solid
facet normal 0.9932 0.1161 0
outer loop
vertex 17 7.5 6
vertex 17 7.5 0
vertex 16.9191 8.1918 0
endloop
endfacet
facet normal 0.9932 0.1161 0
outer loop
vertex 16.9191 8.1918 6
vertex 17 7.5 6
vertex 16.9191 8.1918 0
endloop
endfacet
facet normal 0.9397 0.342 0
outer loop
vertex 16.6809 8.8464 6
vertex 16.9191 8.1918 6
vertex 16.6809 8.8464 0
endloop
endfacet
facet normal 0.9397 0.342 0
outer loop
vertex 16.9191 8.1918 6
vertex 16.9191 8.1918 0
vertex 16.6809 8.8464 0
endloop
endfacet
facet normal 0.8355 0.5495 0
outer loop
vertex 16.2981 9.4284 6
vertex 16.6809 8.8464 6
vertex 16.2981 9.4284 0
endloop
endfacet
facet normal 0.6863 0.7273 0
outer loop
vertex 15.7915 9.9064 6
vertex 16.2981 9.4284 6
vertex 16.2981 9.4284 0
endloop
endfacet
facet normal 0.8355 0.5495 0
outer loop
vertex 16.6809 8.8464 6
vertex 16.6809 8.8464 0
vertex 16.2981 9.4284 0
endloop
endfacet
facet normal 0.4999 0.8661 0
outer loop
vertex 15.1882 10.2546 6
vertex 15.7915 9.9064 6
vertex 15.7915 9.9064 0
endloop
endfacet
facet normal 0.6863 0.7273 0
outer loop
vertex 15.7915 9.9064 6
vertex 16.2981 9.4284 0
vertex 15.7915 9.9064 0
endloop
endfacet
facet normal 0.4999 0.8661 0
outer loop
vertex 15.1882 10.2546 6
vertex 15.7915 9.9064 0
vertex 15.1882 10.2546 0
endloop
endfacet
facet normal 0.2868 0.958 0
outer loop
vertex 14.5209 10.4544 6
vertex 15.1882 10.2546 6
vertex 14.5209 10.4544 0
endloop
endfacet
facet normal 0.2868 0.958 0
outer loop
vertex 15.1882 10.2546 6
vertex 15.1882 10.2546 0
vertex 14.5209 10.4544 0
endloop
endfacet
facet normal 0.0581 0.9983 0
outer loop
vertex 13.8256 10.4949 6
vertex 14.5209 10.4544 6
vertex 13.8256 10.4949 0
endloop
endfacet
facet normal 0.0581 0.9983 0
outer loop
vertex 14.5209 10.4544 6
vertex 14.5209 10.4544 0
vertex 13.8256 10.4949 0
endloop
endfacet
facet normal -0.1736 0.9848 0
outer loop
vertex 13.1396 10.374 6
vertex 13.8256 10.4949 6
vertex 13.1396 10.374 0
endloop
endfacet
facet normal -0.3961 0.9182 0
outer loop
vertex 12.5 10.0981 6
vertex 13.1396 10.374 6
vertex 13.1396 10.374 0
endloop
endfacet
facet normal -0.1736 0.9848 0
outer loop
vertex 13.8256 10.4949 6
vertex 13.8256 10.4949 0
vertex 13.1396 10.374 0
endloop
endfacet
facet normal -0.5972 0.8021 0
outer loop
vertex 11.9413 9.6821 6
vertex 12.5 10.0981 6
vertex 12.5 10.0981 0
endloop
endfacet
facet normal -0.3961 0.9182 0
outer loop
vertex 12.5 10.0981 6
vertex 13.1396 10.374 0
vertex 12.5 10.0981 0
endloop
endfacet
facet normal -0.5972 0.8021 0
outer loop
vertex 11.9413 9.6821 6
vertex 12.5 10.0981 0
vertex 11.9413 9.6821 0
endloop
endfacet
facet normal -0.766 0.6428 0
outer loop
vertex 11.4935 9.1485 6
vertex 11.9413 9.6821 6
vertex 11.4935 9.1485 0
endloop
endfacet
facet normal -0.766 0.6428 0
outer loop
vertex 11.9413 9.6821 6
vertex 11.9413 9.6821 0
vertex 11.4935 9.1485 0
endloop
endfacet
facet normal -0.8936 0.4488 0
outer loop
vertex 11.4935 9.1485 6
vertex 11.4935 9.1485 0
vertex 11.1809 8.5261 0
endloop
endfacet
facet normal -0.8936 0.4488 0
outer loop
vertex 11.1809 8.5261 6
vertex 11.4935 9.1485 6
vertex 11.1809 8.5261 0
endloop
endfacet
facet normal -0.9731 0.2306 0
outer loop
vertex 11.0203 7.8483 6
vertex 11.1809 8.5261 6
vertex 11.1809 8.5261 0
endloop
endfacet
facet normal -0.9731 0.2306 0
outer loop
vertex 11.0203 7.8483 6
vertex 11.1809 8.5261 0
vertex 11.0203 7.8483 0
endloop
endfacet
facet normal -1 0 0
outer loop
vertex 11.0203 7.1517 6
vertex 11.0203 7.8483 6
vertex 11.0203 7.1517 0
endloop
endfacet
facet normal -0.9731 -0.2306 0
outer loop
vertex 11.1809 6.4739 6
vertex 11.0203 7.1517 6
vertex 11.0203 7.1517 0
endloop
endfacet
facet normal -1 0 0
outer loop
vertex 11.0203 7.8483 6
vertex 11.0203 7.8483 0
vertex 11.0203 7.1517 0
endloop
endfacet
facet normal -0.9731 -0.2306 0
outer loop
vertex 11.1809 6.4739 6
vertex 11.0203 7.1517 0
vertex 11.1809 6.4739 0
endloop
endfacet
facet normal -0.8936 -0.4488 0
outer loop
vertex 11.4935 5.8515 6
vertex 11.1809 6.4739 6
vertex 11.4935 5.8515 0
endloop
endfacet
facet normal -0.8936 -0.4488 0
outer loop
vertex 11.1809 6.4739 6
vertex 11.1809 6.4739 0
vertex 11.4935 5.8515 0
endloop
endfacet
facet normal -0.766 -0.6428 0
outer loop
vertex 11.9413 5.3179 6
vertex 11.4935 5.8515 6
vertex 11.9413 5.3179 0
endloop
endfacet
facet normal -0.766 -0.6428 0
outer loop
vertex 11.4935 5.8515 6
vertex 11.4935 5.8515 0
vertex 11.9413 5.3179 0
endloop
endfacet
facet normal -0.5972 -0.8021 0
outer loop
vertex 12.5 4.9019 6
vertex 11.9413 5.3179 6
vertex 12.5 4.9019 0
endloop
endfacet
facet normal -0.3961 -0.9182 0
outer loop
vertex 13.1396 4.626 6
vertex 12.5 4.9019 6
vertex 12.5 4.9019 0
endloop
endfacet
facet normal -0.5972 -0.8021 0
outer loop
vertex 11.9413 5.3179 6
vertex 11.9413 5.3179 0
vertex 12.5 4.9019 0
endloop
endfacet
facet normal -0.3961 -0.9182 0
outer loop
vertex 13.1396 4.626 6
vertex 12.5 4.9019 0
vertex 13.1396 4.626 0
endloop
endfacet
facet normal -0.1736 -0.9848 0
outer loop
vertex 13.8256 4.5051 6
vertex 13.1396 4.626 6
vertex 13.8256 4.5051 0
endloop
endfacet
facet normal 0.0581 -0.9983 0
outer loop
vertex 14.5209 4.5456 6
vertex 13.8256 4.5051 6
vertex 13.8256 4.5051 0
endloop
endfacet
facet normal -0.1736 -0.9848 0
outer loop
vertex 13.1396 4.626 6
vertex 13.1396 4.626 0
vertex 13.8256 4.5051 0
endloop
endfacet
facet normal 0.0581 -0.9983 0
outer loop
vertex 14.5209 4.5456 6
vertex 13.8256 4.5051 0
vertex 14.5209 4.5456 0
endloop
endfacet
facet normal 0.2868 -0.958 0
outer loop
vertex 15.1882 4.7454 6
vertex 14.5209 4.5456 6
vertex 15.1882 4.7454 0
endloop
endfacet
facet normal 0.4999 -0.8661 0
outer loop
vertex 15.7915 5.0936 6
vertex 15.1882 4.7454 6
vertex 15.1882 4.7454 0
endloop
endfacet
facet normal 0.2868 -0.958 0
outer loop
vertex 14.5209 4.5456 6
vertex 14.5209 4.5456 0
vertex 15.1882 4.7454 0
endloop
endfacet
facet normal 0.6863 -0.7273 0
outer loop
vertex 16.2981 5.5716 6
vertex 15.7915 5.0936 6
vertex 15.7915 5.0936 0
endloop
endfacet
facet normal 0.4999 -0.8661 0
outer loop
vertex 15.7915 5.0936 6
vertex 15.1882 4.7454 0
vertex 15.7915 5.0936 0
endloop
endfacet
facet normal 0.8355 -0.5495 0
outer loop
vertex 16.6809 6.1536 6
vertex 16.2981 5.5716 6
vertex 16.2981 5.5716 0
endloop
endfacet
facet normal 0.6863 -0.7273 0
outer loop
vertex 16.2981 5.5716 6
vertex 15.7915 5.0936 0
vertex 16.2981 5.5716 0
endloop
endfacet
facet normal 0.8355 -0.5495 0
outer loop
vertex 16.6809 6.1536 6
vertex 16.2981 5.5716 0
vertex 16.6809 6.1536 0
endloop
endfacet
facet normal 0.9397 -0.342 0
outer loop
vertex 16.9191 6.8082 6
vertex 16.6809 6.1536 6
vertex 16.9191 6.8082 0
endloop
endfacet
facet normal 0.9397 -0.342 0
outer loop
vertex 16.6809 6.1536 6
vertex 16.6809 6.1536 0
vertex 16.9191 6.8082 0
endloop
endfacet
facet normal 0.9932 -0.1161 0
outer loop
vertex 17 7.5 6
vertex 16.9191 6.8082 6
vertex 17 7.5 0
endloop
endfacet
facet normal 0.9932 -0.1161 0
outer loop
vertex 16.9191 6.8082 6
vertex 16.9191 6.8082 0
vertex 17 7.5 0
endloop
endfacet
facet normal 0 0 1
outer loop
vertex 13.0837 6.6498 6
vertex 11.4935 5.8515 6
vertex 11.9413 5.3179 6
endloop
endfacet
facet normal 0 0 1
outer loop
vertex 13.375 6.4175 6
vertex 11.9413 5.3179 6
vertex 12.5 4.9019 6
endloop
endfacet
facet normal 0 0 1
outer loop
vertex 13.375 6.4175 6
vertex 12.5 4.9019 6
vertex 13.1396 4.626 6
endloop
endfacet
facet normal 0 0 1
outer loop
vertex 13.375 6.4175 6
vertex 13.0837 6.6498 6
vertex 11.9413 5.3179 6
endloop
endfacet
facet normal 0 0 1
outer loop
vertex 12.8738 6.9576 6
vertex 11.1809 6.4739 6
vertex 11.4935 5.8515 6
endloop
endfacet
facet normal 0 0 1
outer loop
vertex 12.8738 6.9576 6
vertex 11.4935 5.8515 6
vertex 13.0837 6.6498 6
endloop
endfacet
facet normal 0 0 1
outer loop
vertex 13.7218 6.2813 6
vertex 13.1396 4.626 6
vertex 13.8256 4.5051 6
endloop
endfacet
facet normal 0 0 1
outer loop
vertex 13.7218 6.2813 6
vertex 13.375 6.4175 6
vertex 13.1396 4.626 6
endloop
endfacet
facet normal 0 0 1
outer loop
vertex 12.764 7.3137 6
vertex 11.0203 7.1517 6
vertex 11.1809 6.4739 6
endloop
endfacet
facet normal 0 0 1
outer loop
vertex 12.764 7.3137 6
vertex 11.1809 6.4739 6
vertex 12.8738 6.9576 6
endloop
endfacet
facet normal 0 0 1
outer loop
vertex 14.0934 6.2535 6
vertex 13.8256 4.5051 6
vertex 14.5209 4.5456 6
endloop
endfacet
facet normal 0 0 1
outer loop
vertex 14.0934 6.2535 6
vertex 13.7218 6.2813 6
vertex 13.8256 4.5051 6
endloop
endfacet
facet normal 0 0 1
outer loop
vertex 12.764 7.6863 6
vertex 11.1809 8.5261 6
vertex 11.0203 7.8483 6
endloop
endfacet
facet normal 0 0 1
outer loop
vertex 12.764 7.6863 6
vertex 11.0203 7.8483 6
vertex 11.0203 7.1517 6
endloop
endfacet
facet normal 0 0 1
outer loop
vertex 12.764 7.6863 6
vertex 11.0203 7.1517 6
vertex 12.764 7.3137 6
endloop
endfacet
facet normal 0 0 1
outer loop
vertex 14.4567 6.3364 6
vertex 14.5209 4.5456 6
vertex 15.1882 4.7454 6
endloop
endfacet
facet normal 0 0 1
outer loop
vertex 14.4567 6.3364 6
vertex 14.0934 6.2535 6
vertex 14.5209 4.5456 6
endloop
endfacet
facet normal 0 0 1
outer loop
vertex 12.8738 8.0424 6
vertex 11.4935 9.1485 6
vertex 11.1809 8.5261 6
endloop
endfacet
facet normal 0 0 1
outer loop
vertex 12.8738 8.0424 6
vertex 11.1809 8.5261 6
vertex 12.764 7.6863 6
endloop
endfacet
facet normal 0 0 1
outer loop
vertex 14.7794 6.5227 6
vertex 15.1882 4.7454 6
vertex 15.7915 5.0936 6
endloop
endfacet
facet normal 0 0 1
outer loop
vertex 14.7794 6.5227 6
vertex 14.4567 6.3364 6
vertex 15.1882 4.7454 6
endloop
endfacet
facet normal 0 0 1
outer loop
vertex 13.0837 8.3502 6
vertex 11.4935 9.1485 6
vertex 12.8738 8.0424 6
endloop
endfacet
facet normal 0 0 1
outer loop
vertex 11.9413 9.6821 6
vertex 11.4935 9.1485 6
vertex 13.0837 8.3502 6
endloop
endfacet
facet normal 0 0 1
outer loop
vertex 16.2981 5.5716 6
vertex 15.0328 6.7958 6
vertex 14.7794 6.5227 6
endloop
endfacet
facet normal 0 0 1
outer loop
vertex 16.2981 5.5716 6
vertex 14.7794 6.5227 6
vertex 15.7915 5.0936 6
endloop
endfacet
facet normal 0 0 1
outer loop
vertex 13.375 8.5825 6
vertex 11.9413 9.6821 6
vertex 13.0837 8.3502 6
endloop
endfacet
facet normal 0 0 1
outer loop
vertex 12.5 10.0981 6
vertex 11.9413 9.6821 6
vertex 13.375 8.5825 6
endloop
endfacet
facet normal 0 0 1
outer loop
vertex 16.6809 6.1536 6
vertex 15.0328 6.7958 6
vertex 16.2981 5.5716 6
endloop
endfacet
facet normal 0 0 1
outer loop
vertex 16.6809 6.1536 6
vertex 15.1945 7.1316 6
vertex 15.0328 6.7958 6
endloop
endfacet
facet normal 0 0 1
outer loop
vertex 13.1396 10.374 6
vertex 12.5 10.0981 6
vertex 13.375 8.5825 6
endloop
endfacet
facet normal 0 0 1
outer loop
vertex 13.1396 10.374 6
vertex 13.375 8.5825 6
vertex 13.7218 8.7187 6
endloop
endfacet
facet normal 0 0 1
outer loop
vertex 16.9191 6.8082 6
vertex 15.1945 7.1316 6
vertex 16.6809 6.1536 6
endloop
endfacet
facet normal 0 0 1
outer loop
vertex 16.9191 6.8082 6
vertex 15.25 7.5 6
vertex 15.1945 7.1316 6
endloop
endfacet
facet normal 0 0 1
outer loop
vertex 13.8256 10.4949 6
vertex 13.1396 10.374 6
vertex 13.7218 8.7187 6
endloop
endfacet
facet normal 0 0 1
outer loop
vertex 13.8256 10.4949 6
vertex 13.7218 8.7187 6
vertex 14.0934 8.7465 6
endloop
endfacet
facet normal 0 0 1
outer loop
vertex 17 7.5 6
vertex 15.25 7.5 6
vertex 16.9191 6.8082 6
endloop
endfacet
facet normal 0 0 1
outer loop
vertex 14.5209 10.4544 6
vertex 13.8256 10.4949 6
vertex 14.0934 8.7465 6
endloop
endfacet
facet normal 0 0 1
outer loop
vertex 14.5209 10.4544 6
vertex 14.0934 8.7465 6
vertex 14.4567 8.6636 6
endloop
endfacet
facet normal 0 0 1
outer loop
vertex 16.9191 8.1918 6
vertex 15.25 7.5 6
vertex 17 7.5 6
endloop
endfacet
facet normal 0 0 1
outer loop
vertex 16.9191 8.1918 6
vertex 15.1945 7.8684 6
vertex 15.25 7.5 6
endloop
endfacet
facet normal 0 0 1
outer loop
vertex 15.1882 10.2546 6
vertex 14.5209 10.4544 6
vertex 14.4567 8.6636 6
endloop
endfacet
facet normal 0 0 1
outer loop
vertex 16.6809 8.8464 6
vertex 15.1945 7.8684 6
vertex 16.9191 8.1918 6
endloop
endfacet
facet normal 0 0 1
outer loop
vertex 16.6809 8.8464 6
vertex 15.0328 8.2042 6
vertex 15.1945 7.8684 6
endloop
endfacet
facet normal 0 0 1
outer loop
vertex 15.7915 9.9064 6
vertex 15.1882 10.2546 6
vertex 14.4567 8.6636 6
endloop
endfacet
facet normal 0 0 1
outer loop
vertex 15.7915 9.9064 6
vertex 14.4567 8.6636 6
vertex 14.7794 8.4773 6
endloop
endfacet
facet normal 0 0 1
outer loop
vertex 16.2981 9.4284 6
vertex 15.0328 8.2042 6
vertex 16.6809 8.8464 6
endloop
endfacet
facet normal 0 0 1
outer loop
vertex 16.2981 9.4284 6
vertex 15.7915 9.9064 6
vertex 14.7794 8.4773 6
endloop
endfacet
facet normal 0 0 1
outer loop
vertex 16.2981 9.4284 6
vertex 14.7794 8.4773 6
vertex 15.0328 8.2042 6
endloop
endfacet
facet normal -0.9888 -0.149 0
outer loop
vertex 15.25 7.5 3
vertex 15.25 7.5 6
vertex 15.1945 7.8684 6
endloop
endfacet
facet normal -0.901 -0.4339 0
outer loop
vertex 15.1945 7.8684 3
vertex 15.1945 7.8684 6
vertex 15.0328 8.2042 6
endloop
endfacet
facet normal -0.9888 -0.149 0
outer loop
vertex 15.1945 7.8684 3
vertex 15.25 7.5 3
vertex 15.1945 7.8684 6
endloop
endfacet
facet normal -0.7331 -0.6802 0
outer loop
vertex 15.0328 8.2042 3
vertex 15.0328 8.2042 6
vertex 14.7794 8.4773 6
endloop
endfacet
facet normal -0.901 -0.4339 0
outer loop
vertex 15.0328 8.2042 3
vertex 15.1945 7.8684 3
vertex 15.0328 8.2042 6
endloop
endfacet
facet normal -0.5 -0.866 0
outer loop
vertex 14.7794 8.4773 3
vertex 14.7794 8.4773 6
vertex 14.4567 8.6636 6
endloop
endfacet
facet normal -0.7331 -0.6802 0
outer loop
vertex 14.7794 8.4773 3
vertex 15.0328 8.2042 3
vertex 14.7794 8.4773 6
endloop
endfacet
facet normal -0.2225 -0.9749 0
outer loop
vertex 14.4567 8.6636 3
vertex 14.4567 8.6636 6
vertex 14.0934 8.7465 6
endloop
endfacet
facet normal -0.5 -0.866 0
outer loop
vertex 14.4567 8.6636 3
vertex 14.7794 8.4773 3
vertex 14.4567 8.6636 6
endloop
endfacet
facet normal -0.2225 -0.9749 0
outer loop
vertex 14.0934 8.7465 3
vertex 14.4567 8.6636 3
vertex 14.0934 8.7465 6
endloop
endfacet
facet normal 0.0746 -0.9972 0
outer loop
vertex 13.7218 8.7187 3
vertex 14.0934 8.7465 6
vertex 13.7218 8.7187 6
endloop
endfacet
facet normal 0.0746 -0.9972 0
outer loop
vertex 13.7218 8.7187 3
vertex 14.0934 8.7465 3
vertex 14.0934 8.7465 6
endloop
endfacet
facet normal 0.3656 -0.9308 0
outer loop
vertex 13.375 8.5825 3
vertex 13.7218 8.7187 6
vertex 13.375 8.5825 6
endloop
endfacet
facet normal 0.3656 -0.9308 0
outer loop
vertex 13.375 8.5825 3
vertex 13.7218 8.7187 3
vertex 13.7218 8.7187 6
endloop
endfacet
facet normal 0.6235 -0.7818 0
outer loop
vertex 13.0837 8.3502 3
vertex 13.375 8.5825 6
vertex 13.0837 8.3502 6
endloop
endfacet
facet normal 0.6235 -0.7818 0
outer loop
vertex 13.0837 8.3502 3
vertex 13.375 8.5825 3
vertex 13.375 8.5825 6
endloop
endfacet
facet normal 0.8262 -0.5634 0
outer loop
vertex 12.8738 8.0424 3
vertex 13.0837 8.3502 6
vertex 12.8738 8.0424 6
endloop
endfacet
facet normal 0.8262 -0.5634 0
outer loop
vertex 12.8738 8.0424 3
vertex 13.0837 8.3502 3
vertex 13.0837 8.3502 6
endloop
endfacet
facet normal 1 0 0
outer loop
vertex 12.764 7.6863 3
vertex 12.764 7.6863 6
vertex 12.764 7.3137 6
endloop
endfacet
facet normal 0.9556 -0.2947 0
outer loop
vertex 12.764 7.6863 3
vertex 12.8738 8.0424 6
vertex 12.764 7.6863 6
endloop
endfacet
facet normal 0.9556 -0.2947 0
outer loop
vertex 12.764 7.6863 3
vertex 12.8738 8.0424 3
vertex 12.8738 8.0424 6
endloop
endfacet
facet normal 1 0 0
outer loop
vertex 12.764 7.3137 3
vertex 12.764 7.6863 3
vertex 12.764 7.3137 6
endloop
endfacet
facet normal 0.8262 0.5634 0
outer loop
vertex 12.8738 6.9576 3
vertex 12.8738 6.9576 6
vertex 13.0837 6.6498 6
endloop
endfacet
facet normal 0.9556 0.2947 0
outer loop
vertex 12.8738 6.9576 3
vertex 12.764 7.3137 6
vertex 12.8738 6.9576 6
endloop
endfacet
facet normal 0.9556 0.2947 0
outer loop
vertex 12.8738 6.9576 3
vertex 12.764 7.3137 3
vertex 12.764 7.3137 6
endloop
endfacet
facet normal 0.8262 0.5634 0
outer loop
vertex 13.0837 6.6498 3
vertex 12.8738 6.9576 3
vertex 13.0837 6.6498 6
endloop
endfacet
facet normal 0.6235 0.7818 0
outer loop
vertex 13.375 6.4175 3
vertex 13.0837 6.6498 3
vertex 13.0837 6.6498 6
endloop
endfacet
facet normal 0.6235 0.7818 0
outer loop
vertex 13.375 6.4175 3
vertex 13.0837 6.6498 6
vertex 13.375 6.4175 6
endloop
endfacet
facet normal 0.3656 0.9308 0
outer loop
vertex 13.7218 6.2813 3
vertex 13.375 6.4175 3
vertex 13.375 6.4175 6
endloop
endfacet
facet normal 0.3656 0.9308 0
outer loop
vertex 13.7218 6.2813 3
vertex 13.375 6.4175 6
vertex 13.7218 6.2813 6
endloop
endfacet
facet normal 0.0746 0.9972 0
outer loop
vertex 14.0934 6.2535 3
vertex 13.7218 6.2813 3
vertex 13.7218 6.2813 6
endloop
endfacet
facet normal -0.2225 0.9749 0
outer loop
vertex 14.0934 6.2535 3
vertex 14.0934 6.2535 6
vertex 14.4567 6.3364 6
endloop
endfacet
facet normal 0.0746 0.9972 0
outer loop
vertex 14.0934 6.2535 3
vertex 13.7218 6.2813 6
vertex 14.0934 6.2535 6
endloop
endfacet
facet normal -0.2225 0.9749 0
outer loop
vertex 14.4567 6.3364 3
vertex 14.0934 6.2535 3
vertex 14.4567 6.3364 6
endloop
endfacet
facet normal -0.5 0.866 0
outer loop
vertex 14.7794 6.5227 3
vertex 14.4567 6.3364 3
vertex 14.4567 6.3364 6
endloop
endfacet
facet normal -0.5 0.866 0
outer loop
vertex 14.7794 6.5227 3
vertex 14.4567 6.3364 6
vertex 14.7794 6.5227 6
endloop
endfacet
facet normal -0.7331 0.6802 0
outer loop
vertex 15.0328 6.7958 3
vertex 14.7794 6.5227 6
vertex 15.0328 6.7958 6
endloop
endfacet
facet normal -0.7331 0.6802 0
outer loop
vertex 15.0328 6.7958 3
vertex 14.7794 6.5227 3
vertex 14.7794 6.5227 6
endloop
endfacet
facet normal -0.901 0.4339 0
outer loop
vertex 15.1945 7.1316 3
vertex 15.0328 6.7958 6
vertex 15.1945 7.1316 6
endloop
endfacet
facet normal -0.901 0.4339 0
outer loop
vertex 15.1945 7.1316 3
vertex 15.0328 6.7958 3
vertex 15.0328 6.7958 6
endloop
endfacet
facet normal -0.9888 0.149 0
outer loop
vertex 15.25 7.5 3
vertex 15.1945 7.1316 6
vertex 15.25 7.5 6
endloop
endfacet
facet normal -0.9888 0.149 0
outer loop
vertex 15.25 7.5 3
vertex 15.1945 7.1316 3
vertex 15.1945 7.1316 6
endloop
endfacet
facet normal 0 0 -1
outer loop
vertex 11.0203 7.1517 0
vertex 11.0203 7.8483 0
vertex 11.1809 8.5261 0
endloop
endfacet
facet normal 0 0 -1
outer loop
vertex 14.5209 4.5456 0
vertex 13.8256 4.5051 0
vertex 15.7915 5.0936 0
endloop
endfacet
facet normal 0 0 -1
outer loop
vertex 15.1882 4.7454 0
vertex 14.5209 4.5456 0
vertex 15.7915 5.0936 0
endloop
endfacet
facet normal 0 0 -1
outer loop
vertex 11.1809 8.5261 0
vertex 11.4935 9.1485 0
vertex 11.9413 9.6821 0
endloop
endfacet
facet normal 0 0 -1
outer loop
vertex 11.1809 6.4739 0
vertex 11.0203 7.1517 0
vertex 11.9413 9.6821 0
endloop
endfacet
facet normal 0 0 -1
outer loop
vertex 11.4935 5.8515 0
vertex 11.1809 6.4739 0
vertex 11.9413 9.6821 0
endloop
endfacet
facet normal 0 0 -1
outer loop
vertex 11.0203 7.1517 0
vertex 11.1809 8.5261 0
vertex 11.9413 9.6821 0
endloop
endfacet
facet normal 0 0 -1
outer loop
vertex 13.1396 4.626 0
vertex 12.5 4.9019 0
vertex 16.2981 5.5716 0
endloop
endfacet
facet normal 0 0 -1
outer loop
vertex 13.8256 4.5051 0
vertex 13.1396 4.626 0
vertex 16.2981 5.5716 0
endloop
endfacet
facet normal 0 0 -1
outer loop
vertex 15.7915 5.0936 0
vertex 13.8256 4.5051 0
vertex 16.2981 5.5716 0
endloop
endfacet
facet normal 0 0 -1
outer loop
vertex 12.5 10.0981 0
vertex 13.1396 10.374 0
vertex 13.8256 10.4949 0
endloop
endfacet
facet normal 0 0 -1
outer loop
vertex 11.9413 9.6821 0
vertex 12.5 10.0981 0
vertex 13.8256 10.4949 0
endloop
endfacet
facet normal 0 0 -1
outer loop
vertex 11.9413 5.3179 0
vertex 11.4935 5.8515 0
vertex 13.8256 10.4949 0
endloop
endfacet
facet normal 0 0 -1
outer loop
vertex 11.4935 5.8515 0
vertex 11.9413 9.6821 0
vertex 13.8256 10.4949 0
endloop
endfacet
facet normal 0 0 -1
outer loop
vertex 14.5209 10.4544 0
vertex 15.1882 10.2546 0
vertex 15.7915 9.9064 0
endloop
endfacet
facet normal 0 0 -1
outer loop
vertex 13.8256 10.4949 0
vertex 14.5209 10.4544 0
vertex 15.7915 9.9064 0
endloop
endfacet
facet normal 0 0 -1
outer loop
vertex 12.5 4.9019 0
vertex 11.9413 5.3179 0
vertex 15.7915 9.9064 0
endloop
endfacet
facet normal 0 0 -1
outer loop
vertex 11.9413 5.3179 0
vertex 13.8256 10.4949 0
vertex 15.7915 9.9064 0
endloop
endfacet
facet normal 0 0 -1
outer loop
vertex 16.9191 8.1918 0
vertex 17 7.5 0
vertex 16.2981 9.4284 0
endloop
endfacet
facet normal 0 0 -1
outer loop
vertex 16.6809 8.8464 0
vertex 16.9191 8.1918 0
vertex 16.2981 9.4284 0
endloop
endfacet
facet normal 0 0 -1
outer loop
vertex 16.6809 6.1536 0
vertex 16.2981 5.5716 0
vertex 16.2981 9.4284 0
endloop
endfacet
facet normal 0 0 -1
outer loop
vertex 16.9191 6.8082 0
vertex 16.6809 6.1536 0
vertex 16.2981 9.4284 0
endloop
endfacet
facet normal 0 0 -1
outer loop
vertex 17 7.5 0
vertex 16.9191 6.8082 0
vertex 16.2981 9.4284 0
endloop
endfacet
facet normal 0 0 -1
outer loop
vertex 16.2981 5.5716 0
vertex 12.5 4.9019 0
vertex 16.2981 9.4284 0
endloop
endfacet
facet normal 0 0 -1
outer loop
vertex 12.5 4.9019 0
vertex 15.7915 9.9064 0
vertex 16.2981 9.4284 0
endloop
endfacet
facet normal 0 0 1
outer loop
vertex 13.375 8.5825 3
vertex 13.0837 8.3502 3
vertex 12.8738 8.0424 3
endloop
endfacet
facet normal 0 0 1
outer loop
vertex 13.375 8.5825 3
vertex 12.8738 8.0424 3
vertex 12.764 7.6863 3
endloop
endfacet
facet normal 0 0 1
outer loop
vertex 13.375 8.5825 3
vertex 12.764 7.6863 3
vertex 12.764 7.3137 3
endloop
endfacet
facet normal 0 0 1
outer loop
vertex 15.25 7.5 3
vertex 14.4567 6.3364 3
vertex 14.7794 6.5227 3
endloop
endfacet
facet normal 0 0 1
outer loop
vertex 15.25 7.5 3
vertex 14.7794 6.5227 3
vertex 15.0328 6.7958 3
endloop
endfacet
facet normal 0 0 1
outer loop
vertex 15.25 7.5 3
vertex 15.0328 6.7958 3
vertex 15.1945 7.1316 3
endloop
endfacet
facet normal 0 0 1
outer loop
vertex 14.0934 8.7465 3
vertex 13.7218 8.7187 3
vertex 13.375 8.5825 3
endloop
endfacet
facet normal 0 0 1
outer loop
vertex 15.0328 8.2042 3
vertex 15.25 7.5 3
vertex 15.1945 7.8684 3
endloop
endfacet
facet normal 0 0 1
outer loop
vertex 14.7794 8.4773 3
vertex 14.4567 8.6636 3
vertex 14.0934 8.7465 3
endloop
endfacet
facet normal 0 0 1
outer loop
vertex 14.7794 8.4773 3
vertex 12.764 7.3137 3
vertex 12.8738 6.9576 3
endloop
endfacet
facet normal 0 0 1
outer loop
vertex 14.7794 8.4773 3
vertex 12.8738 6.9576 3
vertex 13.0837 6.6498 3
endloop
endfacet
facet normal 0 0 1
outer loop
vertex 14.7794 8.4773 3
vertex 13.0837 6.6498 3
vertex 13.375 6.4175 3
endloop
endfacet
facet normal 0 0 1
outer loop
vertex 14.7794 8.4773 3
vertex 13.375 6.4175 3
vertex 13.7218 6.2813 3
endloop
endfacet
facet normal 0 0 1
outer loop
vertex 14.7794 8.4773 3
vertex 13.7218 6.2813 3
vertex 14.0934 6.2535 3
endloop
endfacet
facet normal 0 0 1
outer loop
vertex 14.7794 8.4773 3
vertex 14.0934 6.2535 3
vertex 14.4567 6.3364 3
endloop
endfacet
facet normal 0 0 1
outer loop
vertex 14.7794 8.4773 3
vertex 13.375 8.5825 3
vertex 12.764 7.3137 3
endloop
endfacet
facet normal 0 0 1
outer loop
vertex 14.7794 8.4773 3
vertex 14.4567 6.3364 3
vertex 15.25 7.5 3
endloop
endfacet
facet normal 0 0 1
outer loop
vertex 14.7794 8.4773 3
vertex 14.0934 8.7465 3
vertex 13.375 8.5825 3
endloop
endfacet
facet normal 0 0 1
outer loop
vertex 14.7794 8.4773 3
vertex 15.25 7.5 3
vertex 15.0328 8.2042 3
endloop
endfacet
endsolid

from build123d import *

# Parameters (mm, degrees)
CYLINDER008_R     = 1.25
CYLINDER008_DEPTH = 5
CYLINDER019_R     = 3
CYLINDER019_DEPTH = 6


with BuildPart() as b_sw001:
    # Cylinder008 → Cylinder008 (new body)
    with BuildSketch(Plane(origin=(50, 14, 3), x_dir=(1, 0, 0), z_dir=(0, 0, 1))):
        Circle(CYLINDER008_R)
    extrude(amount=CYLINDER008_DEPTH)


with BuildPart() as h_cut009:
    # Cylinder019 → Cylinder019 (new body)
    with BuildSketch(Plane(origin=(50, 14, 0), x_dir=(1, 0, 0), z_dir=(0, 0, 1))):
        Circle(CYLINDER019_R)
    extrude(amount=CYLINDER019_DEPTH)

    # Cut009: cut B_SW001
    add(b_sw001.part, mode=Mode.SUBTRACT)


with BuildPart() as h_cut009_1:
    # Cut009 placement: moved
    add(h_cut009.part.moved(Location((-36, -6.5, 0))))


solid = h_cut009_1.part
